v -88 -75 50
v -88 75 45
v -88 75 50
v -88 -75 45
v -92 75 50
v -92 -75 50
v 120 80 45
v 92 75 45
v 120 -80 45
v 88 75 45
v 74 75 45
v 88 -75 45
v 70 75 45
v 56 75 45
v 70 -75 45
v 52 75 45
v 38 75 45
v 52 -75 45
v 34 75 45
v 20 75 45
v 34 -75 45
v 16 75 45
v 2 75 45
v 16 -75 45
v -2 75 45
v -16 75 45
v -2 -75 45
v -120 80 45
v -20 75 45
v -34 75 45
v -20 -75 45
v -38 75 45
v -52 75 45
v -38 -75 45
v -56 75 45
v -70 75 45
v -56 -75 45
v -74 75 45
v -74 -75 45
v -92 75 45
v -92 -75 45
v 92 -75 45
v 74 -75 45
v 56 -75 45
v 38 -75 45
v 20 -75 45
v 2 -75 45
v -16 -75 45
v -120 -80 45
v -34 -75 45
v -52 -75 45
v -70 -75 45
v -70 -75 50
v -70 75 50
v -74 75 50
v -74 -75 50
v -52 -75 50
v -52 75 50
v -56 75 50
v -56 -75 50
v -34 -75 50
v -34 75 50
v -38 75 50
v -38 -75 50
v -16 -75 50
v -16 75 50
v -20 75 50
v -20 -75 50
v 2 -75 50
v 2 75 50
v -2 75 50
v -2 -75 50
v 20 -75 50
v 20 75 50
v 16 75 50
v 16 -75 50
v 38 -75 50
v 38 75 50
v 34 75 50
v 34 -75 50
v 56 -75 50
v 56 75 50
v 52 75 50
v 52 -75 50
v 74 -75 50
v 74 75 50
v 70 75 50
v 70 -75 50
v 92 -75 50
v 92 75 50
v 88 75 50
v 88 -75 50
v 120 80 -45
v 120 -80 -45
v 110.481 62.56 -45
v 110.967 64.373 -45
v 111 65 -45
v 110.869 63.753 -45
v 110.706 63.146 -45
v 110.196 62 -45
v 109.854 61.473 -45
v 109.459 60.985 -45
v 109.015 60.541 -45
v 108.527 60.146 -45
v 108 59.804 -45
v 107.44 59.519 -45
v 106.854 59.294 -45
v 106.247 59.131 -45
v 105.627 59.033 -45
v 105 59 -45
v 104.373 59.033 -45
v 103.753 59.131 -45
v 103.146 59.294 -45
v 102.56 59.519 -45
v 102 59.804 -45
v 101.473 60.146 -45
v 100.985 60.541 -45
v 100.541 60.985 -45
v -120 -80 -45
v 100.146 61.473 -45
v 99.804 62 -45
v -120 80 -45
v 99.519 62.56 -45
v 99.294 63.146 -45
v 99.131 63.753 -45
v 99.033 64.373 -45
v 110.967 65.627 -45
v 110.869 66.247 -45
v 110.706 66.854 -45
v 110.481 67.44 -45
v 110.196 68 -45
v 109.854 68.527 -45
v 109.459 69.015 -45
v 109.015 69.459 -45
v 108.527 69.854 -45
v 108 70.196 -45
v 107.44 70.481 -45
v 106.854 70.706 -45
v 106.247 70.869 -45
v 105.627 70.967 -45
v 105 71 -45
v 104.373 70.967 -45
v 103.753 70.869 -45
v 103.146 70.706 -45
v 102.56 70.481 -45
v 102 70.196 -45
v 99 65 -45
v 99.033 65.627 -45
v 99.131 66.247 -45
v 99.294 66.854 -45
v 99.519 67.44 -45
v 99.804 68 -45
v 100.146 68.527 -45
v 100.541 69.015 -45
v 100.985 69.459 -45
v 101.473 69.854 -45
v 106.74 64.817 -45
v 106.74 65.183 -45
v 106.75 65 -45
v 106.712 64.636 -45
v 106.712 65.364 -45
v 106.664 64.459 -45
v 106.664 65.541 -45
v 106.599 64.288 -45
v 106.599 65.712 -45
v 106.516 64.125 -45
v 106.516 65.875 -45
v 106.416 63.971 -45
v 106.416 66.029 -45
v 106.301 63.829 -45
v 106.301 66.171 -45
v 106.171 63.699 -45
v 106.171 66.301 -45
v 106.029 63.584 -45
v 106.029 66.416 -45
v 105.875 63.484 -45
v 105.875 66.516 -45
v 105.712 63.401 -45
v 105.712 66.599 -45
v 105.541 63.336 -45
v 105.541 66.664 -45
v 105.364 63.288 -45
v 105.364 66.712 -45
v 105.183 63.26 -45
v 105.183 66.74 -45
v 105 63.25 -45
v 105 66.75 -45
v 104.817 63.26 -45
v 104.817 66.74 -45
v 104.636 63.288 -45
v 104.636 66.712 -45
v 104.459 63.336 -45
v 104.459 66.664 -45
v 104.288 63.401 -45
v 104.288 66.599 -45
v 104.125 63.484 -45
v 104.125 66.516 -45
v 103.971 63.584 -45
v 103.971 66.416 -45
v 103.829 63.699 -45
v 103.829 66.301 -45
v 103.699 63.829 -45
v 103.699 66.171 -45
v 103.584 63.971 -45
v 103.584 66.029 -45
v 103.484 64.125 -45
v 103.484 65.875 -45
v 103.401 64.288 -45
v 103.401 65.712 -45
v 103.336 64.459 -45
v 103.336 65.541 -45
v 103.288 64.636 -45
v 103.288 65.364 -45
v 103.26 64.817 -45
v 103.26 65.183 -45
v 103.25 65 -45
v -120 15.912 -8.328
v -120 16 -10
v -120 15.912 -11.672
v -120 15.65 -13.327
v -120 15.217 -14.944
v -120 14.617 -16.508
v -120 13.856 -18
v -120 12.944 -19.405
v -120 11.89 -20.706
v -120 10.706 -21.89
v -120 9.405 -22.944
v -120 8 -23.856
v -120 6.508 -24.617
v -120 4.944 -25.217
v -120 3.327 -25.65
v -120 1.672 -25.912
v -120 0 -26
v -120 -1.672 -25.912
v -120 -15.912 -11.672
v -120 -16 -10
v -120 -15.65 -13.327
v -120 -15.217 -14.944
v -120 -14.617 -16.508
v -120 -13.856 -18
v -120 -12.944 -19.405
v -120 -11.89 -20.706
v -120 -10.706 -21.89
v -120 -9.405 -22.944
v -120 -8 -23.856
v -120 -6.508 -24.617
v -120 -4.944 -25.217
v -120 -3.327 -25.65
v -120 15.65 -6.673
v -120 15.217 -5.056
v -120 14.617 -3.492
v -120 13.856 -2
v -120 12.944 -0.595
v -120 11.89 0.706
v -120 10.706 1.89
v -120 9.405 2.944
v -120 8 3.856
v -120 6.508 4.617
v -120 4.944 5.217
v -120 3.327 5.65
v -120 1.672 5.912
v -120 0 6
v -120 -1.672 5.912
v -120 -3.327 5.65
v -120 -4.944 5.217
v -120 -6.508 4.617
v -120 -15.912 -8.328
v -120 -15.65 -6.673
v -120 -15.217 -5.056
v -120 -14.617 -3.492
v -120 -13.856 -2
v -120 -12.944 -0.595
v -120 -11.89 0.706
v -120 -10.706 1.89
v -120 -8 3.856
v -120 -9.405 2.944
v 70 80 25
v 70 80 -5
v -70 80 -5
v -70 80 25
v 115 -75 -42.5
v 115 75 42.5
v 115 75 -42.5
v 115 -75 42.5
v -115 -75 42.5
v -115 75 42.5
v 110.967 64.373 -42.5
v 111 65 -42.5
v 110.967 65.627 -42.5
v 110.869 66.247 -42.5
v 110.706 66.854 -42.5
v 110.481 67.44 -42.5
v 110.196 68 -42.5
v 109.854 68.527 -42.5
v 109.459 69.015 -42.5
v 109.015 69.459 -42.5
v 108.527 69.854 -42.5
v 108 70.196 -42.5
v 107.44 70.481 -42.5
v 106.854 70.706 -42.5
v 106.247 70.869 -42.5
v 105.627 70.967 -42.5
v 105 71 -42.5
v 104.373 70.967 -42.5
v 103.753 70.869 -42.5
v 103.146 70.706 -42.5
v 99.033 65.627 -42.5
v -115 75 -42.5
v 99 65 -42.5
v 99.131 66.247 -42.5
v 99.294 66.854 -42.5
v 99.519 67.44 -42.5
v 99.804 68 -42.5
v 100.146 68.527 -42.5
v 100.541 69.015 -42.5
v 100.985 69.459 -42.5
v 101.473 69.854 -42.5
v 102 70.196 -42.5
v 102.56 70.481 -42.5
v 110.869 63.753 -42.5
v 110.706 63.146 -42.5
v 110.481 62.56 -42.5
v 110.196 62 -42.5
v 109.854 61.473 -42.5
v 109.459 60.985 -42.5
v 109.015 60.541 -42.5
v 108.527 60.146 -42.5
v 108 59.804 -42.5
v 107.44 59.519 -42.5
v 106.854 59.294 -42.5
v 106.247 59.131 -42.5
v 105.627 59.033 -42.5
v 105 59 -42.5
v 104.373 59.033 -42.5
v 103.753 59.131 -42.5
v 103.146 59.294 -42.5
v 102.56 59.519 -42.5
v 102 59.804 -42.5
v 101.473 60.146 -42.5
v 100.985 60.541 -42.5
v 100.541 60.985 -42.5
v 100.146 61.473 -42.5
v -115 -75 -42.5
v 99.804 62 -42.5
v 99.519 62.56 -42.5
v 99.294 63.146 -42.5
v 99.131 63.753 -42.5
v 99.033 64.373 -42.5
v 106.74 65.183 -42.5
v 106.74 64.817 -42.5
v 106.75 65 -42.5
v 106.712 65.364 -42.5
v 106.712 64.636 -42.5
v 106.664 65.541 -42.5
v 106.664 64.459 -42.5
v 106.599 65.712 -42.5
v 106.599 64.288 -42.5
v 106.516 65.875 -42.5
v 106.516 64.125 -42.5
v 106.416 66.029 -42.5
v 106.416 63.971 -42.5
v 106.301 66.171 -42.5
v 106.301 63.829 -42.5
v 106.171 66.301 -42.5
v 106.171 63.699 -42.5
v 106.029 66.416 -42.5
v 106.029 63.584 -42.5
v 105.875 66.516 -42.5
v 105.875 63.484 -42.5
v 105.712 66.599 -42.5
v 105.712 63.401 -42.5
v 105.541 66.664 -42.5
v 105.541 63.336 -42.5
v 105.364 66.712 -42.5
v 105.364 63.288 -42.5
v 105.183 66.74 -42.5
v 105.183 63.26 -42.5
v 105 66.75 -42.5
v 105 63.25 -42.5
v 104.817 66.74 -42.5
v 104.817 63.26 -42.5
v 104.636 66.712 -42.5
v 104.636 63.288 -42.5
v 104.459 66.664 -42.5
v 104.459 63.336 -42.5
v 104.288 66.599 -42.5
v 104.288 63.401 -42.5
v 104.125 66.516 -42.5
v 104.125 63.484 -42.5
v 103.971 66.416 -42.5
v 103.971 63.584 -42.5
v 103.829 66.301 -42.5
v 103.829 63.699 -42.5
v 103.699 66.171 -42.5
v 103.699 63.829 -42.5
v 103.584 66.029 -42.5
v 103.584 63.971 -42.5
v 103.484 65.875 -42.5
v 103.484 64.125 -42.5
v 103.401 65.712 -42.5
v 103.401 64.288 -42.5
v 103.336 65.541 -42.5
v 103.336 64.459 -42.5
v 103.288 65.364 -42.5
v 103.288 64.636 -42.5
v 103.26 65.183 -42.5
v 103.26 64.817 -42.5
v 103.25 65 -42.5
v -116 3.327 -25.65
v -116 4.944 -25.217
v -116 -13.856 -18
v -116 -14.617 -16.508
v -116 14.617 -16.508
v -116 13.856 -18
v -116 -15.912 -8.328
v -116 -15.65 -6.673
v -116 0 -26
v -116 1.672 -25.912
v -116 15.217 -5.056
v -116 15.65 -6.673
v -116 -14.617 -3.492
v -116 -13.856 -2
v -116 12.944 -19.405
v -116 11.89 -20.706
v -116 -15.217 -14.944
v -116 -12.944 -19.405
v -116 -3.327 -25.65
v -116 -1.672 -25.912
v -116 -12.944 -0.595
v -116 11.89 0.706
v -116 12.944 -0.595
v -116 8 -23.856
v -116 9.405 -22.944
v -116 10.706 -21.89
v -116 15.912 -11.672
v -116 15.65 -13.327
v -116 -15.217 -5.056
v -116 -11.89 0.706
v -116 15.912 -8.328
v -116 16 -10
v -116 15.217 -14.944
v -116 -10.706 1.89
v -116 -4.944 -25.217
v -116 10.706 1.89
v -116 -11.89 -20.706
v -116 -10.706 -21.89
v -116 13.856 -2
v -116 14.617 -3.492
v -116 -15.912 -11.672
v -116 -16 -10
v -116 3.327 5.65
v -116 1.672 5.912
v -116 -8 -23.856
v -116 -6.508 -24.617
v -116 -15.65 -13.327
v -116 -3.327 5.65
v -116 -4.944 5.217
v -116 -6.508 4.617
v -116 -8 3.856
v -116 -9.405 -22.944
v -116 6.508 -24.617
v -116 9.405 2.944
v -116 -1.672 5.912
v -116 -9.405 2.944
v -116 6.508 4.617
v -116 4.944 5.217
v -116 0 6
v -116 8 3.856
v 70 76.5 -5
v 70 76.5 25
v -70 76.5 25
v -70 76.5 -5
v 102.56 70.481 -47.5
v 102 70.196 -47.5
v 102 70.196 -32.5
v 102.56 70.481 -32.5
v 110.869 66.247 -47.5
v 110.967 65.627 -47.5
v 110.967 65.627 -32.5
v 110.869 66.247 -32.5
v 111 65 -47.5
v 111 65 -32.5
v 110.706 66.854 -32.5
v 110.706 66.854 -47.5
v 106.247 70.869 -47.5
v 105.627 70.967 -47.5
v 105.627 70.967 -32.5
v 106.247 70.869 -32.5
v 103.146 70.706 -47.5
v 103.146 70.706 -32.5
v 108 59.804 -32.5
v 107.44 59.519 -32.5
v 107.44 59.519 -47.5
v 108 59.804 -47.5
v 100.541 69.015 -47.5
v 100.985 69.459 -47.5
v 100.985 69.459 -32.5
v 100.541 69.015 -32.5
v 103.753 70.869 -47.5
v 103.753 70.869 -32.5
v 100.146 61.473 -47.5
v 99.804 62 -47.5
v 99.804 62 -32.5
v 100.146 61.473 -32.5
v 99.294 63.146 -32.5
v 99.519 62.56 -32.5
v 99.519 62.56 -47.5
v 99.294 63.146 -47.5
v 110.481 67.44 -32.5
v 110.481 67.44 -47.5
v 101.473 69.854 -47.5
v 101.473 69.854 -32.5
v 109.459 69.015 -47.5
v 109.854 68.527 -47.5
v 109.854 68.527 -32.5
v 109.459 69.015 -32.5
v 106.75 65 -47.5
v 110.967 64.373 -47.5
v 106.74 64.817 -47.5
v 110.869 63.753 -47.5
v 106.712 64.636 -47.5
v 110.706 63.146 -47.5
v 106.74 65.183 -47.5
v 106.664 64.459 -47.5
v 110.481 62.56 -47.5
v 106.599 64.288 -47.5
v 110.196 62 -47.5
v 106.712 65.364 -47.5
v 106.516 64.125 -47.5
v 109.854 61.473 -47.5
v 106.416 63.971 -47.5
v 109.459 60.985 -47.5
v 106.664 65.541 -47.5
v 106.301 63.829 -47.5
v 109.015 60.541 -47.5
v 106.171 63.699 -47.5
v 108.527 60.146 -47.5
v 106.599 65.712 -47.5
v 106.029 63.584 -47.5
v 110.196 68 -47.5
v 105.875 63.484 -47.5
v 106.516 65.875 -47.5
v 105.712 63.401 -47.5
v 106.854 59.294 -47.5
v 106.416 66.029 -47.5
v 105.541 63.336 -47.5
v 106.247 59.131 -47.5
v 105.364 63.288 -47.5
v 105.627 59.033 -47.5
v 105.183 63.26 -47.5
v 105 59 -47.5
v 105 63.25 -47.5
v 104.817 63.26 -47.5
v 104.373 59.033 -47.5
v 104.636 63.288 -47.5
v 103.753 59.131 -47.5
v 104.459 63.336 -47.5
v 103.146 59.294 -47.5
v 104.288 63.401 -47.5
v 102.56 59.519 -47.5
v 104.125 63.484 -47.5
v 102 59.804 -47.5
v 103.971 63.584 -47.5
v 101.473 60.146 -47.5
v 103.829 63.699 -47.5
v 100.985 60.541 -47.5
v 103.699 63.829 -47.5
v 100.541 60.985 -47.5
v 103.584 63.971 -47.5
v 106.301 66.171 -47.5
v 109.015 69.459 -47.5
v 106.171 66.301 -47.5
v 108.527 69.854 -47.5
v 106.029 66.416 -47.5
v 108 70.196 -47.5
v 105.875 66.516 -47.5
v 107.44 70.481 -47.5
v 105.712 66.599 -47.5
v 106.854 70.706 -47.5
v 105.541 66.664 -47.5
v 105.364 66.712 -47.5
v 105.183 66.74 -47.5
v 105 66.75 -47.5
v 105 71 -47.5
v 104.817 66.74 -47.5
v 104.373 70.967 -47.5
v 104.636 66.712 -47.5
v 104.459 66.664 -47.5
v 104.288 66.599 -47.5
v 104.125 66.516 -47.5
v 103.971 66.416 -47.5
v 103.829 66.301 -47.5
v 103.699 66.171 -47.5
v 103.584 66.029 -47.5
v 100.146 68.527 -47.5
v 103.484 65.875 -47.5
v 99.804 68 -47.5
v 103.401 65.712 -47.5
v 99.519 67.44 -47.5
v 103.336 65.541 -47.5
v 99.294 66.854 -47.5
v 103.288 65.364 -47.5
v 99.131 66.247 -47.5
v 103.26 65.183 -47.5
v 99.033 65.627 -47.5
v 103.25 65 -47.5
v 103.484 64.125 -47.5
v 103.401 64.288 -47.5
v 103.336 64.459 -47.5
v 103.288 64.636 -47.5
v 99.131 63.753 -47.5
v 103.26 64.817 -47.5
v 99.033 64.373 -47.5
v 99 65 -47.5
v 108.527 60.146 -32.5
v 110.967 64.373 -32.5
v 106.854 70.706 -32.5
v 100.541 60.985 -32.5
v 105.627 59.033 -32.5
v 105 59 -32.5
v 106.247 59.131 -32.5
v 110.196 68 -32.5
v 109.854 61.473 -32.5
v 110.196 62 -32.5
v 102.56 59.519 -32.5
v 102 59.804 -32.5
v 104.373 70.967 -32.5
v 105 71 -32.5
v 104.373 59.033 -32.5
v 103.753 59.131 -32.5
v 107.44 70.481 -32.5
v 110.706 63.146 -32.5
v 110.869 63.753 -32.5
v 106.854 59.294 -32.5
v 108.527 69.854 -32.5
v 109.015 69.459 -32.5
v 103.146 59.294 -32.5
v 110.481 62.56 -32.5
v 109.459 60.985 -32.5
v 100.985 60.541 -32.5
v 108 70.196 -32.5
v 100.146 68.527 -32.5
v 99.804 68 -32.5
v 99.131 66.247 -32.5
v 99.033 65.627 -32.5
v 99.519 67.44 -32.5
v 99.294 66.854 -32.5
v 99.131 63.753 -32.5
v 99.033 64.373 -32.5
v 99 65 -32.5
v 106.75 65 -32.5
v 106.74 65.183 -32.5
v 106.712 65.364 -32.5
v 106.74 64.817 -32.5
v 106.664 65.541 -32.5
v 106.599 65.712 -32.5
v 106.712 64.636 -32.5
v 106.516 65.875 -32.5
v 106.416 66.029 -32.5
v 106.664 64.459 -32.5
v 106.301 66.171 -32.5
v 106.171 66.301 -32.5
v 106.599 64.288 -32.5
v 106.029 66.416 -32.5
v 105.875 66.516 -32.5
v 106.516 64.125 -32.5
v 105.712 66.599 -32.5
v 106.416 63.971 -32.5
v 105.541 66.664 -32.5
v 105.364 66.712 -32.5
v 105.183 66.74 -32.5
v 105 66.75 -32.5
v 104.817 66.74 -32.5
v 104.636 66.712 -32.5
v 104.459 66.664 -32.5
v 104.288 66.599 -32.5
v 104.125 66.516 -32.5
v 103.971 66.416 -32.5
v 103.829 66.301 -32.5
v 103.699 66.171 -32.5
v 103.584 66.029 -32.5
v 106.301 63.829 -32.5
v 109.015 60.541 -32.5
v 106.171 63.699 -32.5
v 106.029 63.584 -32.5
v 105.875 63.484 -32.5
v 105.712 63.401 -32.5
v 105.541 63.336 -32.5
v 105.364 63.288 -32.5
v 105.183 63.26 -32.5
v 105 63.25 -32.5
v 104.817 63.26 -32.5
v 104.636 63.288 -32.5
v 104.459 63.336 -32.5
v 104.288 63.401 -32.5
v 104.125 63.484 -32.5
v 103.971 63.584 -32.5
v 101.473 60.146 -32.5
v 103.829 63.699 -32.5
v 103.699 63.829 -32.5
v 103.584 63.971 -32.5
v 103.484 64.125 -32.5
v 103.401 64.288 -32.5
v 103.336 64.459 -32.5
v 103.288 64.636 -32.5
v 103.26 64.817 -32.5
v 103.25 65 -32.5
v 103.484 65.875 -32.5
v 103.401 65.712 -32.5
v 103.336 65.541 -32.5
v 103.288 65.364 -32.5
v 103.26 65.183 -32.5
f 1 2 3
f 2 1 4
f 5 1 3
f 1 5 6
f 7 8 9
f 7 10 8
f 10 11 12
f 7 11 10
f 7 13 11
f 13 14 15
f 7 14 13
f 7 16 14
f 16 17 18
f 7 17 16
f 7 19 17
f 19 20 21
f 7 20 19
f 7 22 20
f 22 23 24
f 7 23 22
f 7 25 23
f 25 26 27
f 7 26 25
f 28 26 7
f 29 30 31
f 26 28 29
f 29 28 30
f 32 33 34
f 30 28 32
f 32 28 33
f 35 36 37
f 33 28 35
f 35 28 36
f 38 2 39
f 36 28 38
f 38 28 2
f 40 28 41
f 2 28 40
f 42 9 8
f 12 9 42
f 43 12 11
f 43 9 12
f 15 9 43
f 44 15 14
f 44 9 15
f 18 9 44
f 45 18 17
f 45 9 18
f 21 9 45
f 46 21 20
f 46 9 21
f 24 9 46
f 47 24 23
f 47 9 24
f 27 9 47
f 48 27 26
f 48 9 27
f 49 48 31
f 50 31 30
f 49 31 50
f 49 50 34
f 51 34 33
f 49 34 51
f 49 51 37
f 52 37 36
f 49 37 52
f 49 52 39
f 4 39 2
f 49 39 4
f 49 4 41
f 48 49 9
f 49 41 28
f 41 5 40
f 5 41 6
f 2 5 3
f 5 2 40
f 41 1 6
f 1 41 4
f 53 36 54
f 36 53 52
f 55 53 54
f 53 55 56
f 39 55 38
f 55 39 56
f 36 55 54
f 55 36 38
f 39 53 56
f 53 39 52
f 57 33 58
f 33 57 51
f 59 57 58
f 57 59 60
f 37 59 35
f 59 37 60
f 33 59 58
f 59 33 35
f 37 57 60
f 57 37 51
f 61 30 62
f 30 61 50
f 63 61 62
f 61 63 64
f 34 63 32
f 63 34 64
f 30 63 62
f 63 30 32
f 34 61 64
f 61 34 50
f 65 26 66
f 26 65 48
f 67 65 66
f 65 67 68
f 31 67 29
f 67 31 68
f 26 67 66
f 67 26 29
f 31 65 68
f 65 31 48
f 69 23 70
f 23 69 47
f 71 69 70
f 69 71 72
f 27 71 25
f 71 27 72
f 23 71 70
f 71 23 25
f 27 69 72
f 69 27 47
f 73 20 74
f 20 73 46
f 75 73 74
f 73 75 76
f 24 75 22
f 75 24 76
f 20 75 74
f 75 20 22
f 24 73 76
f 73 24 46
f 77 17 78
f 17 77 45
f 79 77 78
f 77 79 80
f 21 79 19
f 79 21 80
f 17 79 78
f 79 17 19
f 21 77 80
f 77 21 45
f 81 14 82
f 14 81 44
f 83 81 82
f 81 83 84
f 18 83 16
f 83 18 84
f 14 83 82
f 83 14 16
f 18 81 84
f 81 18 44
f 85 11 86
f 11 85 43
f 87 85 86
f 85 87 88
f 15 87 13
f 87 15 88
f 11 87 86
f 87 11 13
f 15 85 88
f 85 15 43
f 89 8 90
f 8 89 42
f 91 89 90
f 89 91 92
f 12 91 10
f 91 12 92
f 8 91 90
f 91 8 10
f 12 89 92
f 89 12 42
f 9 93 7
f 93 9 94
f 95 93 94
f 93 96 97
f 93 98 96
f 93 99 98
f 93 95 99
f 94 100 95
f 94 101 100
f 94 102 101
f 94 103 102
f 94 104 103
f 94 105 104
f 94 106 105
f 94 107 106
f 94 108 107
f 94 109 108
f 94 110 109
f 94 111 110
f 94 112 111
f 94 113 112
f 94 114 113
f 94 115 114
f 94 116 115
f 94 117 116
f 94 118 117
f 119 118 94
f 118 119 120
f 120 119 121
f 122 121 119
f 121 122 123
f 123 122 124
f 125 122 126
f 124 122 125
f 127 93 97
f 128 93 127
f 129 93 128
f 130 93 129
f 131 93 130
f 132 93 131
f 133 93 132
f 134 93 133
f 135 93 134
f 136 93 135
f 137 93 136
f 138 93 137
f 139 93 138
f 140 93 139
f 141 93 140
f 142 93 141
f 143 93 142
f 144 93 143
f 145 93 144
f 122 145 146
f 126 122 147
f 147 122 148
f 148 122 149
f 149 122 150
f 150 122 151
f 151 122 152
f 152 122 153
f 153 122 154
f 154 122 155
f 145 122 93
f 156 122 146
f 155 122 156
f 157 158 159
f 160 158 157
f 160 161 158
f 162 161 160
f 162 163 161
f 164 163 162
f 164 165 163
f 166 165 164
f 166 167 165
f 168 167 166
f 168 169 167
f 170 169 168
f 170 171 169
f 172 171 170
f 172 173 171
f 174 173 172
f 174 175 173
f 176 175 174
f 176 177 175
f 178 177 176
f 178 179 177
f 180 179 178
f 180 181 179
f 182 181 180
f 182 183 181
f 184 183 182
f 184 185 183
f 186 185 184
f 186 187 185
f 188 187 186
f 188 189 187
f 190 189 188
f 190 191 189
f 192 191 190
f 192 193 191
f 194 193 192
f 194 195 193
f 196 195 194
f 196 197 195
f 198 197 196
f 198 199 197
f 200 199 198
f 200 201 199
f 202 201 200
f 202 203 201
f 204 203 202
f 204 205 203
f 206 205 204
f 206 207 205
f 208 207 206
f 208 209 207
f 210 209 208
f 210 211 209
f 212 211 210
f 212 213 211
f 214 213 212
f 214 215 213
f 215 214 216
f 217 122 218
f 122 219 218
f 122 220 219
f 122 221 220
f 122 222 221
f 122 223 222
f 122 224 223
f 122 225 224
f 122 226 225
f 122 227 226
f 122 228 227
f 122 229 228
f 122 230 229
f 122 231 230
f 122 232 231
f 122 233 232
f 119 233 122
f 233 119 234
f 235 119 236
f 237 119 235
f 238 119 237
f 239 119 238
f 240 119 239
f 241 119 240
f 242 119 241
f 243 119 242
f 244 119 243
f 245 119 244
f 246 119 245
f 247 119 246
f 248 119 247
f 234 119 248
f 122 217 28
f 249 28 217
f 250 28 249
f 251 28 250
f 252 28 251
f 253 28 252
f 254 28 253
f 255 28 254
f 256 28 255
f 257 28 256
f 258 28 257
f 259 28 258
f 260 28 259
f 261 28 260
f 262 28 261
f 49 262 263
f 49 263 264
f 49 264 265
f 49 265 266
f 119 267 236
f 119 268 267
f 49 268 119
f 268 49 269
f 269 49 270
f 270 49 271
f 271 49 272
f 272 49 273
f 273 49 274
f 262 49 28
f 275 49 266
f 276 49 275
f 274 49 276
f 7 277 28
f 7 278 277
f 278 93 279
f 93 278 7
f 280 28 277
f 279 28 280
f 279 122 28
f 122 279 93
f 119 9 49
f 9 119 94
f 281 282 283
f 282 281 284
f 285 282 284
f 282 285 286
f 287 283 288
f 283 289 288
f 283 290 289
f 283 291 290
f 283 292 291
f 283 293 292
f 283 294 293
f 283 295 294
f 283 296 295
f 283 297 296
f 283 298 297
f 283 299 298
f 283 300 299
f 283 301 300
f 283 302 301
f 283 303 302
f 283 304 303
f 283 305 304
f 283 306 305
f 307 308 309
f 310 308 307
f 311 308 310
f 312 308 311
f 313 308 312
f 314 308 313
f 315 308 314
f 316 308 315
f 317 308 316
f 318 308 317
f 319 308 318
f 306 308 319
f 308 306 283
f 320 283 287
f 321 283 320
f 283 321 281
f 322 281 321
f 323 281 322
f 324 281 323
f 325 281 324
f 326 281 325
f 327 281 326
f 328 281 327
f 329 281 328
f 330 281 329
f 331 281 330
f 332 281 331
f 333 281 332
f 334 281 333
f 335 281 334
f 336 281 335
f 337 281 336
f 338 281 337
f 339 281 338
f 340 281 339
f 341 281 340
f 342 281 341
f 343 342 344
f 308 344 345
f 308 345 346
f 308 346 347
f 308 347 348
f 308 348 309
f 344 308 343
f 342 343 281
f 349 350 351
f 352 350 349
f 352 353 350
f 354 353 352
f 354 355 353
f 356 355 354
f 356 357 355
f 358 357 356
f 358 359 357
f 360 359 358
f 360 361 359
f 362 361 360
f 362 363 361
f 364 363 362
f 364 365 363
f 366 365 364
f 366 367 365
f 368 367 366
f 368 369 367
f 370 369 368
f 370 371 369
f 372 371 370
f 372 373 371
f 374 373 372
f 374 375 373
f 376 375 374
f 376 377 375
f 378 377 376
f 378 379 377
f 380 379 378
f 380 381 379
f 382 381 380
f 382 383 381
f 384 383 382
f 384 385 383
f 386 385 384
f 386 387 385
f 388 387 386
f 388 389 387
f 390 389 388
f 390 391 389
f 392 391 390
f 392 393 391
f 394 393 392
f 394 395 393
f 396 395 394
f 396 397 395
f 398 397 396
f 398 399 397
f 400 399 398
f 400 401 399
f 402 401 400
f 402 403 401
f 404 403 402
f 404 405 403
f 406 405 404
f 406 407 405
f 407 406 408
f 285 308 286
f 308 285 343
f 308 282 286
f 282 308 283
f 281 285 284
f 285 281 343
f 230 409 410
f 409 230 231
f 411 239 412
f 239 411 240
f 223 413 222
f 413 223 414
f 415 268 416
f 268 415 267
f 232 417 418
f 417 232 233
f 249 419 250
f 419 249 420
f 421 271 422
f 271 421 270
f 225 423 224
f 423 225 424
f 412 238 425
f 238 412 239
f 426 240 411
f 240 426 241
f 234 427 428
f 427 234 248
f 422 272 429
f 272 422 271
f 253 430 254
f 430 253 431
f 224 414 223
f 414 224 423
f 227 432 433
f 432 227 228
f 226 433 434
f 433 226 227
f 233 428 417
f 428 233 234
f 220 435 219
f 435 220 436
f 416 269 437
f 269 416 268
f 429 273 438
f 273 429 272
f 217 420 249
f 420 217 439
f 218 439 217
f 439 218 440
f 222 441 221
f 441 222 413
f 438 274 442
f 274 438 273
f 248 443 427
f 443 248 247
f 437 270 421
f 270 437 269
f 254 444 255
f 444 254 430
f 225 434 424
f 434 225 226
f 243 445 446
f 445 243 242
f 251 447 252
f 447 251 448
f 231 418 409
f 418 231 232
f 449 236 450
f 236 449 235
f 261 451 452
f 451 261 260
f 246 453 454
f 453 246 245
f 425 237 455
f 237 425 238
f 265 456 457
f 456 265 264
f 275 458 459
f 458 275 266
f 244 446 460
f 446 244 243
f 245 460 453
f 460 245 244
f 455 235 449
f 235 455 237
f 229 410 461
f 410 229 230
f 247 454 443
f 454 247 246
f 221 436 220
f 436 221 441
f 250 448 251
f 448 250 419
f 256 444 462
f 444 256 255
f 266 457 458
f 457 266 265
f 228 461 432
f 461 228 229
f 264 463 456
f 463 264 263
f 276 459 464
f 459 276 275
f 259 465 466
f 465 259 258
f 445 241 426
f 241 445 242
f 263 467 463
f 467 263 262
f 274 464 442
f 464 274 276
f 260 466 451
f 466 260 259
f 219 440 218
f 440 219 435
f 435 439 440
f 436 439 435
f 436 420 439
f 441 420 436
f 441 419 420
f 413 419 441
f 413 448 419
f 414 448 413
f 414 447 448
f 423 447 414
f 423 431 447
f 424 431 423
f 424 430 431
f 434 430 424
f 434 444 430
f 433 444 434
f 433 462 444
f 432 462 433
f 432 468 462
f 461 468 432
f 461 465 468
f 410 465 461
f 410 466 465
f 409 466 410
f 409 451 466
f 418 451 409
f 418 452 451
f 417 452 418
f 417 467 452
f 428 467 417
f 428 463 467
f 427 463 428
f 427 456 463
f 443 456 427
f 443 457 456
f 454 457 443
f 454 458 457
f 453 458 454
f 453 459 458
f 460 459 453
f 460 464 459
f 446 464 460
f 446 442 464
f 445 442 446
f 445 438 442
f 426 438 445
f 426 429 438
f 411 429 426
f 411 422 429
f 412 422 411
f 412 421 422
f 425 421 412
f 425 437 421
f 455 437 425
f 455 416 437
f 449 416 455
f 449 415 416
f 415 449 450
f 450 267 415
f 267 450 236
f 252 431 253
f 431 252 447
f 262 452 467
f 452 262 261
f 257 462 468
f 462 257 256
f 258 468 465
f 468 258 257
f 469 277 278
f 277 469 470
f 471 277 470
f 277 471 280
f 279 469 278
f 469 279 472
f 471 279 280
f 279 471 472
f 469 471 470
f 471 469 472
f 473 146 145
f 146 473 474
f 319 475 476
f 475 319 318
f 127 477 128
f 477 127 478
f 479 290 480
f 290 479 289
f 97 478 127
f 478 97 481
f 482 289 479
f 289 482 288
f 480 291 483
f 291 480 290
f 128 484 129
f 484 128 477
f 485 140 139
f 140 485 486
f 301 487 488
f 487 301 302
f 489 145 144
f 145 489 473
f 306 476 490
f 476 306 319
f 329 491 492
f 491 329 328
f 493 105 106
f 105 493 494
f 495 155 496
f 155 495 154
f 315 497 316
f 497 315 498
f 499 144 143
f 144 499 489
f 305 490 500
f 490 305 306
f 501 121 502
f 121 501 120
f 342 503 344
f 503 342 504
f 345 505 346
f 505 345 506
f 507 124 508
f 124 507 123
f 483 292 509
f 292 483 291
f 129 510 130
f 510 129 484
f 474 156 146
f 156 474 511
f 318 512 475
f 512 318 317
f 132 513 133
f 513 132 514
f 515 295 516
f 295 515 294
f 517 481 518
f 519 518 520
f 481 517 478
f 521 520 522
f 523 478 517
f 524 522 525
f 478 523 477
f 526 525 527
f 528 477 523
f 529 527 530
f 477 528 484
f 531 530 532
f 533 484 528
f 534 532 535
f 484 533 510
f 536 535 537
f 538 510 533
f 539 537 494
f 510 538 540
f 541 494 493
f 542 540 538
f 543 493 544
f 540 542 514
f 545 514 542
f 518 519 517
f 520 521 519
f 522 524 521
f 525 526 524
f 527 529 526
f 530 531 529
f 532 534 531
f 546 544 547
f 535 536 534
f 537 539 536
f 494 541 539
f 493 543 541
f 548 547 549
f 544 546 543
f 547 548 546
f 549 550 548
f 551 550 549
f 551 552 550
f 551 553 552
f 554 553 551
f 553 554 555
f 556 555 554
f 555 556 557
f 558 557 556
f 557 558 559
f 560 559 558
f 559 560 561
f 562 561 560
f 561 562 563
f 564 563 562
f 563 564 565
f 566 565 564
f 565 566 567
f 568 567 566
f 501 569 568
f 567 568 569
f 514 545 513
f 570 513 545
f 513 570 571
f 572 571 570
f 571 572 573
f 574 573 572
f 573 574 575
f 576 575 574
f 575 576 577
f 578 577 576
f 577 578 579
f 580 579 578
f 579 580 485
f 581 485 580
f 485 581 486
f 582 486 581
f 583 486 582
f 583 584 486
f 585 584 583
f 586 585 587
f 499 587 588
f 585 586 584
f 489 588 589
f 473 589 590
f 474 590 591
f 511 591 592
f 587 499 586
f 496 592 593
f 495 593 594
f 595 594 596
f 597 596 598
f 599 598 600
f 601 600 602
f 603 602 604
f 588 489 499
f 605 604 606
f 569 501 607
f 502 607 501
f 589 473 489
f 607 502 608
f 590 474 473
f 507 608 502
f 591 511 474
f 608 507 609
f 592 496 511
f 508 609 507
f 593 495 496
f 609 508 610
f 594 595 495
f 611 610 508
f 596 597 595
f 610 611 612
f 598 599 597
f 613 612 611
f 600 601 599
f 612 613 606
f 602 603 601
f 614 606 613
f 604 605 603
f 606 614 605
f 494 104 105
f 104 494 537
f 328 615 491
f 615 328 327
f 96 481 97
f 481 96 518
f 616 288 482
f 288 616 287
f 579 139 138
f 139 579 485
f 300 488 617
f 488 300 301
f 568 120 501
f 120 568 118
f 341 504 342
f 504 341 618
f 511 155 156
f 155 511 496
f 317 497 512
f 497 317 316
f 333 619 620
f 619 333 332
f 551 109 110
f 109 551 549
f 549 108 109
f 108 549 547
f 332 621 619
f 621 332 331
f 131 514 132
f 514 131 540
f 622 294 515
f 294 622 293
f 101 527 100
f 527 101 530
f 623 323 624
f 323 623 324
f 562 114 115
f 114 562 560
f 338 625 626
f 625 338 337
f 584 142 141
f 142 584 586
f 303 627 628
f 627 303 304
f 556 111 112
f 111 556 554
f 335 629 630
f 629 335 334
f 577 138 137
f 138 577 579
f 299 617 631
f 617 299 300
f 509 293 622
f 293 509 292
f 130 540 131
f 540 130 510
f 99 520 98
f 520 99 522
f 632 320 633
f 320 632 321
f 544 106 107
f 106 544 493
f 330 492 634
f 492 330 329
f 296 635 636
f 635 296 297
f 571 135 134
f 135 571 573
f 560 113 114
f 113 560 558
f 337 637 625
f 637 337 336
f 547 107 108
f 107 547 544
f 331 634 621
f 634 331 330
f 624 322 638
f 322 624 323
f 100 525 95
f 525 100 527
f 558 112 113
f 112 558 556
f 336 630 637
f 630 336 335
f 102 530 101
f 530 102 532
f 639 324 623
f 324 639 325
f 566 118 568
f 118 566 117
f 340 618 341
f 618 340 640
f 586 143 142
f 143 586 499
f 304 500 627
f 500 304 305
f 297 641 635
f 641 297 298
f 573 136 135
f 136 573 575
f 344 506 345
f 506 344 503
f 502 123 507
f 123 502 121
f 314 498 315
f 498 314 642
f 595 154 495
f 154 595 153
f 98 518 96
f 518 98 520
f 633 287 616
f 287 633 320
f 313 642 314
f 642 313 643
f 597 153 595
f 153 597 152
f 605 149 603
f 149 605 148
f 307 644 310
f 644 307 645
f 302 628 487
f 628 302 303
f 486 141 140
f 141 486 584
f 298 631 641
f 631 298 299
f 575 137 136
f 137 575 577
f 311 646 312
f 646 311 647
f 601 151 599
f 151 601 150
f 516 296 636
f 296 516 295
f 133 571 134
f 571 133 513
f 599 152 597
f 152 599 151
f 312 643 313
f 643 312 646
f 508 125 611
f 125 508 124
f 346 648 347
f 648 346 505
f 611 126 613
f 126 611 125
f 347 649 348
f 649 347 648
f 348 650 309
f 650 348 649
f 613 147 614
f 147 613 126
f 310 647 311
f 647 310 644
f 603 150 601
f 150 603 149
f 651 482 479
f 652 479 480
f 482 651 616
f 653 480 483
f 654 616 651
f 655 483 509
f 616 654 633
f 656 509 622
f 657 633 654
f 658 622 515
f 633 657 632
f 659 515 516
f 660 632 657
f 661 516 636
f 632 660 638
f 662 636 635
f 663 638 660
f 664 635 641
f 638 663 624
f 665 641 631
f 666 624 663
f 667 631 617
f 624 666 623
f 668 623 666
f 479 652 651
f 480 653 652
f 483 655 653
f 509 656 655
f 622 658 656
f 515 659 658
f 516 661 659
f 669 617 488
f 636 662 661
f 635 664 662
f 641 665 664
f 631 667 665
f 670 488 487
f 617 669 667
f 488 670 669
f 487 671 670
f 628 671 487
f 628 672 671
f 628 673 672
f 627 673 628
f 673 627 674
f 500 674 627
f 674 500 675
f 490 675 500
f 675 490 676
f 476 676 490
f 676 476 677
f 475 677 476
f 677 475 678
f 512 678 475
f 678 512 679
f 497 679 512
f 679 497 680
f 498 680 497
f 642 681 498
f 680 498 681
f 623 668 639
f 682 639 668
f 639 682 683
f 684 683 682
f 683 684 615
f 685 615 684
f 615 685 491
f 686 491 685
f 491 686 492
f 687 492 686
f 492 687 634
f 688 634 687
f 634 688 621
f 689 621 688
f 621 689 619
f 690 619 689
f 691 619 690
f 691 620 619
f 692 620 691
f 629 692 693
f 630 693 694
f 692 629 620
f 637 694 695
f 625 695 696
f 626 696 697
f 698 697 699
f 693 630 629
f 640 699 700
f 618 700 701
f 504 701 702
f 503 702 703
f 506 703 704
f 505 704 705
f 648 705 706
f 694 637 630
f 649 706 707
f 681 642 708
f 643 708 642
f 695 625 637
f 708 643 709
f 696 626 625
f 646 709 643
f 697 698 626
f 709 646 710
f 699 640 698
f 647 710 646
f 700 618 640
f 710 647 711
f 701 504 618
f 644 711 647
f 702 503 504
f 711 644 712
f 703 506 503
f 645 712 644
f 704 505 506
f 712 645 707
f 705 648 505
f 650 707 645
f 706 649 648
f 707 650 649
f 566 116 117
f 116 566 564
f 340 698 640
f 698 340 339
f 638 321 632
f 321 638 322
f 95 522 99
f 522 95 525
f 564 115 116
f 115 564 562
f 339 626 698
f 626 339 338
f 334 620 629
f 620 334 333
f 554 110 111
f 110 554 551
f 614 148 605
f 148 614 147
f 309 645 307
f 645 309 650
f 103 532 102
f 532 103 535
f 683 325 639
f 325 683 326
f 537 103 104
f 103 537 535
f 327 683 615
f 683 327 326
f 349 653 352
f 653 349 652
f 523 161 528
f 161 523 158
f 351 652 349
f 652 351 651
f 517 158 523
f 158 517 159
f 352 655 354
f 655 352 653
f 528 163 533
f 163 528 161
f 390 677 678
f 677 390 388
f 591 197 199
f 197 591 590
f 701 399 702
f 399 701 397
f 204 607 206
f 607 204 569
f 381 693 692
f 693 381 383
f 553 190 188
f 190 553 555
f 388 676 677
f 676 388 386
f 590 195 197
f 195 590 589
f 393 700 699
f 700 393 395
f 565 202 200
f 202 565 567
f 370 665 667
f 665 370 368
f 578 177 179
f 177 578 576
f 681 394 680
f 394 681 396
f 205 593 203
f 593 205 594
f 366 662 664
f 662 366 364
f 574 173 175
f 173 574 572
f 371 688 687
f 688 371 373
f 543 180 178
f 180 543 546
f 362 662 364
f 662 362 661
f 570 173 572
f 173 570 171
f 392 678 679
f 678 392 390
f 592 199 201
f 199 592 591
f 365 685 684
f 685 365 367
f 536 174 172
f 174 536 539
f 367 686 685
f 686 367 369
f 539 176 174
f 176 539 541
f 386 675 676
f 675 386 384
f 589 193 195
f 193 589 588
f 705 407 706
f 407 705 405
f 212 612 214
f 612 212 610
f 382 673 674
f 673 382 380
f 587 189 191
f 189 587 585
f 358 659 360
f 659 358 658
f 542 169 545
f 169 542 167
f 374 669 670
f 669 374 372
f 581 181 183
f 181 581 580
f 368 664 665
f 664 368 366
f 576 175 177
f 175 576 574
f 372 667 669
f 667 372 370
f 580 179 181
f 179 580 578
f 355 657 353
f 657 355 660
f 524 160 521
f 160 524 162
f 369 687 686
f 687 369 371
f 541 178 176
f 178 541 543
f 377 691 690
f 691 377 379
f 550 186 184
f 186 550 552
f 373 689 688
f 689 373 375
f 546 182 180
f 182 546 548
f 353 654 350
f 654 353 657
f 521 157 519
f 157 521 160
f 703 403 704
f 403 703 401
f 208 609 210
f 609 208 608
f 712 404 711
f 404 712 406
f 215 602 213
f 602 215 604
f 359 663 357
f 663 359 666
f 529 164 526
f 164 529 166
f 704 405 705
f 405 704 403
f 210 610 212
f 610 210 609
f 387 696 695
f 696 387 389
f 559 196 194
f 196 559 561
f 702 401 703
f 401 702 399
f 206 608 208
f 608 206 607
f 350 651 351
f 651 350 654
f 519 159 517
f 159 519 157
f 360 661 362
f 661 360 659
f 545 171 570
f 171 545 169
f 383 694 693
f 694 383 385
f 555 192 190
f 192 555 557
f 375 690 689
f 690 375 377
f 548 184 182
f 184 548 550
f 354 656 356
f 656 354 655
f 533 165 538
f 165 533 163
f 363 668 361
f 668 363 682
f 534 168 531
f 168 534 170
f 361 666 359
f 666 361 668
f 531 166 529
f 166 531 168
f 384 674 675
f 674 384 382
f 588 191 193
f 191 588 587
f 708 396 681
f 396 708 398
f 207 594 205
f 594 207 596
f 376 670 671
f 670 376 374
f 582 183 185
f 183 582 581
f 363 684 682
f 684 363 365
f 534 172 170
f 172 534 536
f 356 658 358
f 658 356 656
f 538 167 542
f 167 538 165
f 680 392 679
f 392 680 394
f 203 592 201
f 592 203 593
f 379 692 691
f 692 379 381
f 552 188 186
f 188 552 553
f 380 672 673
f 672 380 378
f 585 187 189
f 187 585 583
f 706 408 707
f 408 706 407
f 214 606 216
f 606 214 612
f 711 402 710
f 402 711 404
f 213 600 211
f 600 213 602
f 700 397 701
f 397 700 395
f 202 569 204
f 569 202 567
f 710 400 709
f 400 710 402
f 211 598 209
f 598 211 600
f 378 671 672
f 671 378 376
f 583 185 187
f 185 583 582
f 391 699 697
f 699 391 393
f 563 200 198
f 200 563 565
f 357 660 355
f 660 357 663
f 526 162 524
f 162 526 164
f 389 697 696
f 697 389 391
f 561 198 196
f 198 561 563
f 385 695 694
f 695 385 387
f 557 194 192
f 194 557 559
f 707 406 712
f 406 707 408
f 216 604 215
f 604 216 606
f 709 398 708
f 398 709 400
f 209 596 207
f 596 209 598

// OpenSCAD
// File Path: src/hardware/ge_amplifier_chassis.scad
// GE Heavy Industrial Weatherproof Signal Power Amplifier Housing Model
// Designed to shield internal 16-State Analog Silicon from high-draw inductive fields

$fn = 60;

// Central structural enclosure dimensions (in millimeters)
chassis_length = 240.0;
chassis_width  = 160.0;
chassis_height = 90.0;
wall_thickness = 5.0;

module ge_industrial_housing() {
    difference() {
        union() {
            // Main Cast Aluminum Core Body block
            cube([chassis_length, chassis_width, chassis_height], center = true);
            
            // Generate Integrated Passive Cooling Fin Array for Thermal Shedding
            for (i = [-5 : 5]) {
                translate([i * 18, 0, (chassis_height / 2) + 2.5])
                    cube([4.0, chassis_width - 10.0, 5.0], center = true);
            }
        }
        
        // Hollow out inner cavity cavity leaving rugged protective wall metrics
        cube([
            chassis_length - (2 * wall_thickness), 
            chassis_width - (2 * wall_thickness), 
            chassis_height - wall_thickness
        ], center = true);
        
        // Cutout port for the MIL-SPEC Amphenol Twist-Lock Bayonet Terminal
        translate([-(chassis_length / 2) - 1, 0, -10])
            rotate([0, 90, 0])
                cylinder(h = wall_thickness + 5, d = 32.0, center = true);
                
        // Recessed Laser-Etched Branding Plate Window Channel
        // Positioned for the "GUNDAM ROBOTIC SYSTEMS" Decal in Plavsky Font
        translate([0, (chassis_width / 2) - 1, 10])
            cube([140.0, wall_thickness, 30.0], center = true);
    }
    
    // Internal PCB Corner Standoff Anchor Bosses
    translate([
        (chassis_length/2) - wall_thickness - 10, 
        (chassis_width/2) - wall_thickness - 10, 
        -(chassis_height/2) + 5
    ])
        difference() {
            cylinder(h = 15, d = 12, center = true);
            cylinder(h = 20, d = 3.5, center = true); // Pre-drilled for M3 tap lines
        }
}

// Instantiate the industrial enclosure die for toolroom machining execution
ge_industrial_housing();
